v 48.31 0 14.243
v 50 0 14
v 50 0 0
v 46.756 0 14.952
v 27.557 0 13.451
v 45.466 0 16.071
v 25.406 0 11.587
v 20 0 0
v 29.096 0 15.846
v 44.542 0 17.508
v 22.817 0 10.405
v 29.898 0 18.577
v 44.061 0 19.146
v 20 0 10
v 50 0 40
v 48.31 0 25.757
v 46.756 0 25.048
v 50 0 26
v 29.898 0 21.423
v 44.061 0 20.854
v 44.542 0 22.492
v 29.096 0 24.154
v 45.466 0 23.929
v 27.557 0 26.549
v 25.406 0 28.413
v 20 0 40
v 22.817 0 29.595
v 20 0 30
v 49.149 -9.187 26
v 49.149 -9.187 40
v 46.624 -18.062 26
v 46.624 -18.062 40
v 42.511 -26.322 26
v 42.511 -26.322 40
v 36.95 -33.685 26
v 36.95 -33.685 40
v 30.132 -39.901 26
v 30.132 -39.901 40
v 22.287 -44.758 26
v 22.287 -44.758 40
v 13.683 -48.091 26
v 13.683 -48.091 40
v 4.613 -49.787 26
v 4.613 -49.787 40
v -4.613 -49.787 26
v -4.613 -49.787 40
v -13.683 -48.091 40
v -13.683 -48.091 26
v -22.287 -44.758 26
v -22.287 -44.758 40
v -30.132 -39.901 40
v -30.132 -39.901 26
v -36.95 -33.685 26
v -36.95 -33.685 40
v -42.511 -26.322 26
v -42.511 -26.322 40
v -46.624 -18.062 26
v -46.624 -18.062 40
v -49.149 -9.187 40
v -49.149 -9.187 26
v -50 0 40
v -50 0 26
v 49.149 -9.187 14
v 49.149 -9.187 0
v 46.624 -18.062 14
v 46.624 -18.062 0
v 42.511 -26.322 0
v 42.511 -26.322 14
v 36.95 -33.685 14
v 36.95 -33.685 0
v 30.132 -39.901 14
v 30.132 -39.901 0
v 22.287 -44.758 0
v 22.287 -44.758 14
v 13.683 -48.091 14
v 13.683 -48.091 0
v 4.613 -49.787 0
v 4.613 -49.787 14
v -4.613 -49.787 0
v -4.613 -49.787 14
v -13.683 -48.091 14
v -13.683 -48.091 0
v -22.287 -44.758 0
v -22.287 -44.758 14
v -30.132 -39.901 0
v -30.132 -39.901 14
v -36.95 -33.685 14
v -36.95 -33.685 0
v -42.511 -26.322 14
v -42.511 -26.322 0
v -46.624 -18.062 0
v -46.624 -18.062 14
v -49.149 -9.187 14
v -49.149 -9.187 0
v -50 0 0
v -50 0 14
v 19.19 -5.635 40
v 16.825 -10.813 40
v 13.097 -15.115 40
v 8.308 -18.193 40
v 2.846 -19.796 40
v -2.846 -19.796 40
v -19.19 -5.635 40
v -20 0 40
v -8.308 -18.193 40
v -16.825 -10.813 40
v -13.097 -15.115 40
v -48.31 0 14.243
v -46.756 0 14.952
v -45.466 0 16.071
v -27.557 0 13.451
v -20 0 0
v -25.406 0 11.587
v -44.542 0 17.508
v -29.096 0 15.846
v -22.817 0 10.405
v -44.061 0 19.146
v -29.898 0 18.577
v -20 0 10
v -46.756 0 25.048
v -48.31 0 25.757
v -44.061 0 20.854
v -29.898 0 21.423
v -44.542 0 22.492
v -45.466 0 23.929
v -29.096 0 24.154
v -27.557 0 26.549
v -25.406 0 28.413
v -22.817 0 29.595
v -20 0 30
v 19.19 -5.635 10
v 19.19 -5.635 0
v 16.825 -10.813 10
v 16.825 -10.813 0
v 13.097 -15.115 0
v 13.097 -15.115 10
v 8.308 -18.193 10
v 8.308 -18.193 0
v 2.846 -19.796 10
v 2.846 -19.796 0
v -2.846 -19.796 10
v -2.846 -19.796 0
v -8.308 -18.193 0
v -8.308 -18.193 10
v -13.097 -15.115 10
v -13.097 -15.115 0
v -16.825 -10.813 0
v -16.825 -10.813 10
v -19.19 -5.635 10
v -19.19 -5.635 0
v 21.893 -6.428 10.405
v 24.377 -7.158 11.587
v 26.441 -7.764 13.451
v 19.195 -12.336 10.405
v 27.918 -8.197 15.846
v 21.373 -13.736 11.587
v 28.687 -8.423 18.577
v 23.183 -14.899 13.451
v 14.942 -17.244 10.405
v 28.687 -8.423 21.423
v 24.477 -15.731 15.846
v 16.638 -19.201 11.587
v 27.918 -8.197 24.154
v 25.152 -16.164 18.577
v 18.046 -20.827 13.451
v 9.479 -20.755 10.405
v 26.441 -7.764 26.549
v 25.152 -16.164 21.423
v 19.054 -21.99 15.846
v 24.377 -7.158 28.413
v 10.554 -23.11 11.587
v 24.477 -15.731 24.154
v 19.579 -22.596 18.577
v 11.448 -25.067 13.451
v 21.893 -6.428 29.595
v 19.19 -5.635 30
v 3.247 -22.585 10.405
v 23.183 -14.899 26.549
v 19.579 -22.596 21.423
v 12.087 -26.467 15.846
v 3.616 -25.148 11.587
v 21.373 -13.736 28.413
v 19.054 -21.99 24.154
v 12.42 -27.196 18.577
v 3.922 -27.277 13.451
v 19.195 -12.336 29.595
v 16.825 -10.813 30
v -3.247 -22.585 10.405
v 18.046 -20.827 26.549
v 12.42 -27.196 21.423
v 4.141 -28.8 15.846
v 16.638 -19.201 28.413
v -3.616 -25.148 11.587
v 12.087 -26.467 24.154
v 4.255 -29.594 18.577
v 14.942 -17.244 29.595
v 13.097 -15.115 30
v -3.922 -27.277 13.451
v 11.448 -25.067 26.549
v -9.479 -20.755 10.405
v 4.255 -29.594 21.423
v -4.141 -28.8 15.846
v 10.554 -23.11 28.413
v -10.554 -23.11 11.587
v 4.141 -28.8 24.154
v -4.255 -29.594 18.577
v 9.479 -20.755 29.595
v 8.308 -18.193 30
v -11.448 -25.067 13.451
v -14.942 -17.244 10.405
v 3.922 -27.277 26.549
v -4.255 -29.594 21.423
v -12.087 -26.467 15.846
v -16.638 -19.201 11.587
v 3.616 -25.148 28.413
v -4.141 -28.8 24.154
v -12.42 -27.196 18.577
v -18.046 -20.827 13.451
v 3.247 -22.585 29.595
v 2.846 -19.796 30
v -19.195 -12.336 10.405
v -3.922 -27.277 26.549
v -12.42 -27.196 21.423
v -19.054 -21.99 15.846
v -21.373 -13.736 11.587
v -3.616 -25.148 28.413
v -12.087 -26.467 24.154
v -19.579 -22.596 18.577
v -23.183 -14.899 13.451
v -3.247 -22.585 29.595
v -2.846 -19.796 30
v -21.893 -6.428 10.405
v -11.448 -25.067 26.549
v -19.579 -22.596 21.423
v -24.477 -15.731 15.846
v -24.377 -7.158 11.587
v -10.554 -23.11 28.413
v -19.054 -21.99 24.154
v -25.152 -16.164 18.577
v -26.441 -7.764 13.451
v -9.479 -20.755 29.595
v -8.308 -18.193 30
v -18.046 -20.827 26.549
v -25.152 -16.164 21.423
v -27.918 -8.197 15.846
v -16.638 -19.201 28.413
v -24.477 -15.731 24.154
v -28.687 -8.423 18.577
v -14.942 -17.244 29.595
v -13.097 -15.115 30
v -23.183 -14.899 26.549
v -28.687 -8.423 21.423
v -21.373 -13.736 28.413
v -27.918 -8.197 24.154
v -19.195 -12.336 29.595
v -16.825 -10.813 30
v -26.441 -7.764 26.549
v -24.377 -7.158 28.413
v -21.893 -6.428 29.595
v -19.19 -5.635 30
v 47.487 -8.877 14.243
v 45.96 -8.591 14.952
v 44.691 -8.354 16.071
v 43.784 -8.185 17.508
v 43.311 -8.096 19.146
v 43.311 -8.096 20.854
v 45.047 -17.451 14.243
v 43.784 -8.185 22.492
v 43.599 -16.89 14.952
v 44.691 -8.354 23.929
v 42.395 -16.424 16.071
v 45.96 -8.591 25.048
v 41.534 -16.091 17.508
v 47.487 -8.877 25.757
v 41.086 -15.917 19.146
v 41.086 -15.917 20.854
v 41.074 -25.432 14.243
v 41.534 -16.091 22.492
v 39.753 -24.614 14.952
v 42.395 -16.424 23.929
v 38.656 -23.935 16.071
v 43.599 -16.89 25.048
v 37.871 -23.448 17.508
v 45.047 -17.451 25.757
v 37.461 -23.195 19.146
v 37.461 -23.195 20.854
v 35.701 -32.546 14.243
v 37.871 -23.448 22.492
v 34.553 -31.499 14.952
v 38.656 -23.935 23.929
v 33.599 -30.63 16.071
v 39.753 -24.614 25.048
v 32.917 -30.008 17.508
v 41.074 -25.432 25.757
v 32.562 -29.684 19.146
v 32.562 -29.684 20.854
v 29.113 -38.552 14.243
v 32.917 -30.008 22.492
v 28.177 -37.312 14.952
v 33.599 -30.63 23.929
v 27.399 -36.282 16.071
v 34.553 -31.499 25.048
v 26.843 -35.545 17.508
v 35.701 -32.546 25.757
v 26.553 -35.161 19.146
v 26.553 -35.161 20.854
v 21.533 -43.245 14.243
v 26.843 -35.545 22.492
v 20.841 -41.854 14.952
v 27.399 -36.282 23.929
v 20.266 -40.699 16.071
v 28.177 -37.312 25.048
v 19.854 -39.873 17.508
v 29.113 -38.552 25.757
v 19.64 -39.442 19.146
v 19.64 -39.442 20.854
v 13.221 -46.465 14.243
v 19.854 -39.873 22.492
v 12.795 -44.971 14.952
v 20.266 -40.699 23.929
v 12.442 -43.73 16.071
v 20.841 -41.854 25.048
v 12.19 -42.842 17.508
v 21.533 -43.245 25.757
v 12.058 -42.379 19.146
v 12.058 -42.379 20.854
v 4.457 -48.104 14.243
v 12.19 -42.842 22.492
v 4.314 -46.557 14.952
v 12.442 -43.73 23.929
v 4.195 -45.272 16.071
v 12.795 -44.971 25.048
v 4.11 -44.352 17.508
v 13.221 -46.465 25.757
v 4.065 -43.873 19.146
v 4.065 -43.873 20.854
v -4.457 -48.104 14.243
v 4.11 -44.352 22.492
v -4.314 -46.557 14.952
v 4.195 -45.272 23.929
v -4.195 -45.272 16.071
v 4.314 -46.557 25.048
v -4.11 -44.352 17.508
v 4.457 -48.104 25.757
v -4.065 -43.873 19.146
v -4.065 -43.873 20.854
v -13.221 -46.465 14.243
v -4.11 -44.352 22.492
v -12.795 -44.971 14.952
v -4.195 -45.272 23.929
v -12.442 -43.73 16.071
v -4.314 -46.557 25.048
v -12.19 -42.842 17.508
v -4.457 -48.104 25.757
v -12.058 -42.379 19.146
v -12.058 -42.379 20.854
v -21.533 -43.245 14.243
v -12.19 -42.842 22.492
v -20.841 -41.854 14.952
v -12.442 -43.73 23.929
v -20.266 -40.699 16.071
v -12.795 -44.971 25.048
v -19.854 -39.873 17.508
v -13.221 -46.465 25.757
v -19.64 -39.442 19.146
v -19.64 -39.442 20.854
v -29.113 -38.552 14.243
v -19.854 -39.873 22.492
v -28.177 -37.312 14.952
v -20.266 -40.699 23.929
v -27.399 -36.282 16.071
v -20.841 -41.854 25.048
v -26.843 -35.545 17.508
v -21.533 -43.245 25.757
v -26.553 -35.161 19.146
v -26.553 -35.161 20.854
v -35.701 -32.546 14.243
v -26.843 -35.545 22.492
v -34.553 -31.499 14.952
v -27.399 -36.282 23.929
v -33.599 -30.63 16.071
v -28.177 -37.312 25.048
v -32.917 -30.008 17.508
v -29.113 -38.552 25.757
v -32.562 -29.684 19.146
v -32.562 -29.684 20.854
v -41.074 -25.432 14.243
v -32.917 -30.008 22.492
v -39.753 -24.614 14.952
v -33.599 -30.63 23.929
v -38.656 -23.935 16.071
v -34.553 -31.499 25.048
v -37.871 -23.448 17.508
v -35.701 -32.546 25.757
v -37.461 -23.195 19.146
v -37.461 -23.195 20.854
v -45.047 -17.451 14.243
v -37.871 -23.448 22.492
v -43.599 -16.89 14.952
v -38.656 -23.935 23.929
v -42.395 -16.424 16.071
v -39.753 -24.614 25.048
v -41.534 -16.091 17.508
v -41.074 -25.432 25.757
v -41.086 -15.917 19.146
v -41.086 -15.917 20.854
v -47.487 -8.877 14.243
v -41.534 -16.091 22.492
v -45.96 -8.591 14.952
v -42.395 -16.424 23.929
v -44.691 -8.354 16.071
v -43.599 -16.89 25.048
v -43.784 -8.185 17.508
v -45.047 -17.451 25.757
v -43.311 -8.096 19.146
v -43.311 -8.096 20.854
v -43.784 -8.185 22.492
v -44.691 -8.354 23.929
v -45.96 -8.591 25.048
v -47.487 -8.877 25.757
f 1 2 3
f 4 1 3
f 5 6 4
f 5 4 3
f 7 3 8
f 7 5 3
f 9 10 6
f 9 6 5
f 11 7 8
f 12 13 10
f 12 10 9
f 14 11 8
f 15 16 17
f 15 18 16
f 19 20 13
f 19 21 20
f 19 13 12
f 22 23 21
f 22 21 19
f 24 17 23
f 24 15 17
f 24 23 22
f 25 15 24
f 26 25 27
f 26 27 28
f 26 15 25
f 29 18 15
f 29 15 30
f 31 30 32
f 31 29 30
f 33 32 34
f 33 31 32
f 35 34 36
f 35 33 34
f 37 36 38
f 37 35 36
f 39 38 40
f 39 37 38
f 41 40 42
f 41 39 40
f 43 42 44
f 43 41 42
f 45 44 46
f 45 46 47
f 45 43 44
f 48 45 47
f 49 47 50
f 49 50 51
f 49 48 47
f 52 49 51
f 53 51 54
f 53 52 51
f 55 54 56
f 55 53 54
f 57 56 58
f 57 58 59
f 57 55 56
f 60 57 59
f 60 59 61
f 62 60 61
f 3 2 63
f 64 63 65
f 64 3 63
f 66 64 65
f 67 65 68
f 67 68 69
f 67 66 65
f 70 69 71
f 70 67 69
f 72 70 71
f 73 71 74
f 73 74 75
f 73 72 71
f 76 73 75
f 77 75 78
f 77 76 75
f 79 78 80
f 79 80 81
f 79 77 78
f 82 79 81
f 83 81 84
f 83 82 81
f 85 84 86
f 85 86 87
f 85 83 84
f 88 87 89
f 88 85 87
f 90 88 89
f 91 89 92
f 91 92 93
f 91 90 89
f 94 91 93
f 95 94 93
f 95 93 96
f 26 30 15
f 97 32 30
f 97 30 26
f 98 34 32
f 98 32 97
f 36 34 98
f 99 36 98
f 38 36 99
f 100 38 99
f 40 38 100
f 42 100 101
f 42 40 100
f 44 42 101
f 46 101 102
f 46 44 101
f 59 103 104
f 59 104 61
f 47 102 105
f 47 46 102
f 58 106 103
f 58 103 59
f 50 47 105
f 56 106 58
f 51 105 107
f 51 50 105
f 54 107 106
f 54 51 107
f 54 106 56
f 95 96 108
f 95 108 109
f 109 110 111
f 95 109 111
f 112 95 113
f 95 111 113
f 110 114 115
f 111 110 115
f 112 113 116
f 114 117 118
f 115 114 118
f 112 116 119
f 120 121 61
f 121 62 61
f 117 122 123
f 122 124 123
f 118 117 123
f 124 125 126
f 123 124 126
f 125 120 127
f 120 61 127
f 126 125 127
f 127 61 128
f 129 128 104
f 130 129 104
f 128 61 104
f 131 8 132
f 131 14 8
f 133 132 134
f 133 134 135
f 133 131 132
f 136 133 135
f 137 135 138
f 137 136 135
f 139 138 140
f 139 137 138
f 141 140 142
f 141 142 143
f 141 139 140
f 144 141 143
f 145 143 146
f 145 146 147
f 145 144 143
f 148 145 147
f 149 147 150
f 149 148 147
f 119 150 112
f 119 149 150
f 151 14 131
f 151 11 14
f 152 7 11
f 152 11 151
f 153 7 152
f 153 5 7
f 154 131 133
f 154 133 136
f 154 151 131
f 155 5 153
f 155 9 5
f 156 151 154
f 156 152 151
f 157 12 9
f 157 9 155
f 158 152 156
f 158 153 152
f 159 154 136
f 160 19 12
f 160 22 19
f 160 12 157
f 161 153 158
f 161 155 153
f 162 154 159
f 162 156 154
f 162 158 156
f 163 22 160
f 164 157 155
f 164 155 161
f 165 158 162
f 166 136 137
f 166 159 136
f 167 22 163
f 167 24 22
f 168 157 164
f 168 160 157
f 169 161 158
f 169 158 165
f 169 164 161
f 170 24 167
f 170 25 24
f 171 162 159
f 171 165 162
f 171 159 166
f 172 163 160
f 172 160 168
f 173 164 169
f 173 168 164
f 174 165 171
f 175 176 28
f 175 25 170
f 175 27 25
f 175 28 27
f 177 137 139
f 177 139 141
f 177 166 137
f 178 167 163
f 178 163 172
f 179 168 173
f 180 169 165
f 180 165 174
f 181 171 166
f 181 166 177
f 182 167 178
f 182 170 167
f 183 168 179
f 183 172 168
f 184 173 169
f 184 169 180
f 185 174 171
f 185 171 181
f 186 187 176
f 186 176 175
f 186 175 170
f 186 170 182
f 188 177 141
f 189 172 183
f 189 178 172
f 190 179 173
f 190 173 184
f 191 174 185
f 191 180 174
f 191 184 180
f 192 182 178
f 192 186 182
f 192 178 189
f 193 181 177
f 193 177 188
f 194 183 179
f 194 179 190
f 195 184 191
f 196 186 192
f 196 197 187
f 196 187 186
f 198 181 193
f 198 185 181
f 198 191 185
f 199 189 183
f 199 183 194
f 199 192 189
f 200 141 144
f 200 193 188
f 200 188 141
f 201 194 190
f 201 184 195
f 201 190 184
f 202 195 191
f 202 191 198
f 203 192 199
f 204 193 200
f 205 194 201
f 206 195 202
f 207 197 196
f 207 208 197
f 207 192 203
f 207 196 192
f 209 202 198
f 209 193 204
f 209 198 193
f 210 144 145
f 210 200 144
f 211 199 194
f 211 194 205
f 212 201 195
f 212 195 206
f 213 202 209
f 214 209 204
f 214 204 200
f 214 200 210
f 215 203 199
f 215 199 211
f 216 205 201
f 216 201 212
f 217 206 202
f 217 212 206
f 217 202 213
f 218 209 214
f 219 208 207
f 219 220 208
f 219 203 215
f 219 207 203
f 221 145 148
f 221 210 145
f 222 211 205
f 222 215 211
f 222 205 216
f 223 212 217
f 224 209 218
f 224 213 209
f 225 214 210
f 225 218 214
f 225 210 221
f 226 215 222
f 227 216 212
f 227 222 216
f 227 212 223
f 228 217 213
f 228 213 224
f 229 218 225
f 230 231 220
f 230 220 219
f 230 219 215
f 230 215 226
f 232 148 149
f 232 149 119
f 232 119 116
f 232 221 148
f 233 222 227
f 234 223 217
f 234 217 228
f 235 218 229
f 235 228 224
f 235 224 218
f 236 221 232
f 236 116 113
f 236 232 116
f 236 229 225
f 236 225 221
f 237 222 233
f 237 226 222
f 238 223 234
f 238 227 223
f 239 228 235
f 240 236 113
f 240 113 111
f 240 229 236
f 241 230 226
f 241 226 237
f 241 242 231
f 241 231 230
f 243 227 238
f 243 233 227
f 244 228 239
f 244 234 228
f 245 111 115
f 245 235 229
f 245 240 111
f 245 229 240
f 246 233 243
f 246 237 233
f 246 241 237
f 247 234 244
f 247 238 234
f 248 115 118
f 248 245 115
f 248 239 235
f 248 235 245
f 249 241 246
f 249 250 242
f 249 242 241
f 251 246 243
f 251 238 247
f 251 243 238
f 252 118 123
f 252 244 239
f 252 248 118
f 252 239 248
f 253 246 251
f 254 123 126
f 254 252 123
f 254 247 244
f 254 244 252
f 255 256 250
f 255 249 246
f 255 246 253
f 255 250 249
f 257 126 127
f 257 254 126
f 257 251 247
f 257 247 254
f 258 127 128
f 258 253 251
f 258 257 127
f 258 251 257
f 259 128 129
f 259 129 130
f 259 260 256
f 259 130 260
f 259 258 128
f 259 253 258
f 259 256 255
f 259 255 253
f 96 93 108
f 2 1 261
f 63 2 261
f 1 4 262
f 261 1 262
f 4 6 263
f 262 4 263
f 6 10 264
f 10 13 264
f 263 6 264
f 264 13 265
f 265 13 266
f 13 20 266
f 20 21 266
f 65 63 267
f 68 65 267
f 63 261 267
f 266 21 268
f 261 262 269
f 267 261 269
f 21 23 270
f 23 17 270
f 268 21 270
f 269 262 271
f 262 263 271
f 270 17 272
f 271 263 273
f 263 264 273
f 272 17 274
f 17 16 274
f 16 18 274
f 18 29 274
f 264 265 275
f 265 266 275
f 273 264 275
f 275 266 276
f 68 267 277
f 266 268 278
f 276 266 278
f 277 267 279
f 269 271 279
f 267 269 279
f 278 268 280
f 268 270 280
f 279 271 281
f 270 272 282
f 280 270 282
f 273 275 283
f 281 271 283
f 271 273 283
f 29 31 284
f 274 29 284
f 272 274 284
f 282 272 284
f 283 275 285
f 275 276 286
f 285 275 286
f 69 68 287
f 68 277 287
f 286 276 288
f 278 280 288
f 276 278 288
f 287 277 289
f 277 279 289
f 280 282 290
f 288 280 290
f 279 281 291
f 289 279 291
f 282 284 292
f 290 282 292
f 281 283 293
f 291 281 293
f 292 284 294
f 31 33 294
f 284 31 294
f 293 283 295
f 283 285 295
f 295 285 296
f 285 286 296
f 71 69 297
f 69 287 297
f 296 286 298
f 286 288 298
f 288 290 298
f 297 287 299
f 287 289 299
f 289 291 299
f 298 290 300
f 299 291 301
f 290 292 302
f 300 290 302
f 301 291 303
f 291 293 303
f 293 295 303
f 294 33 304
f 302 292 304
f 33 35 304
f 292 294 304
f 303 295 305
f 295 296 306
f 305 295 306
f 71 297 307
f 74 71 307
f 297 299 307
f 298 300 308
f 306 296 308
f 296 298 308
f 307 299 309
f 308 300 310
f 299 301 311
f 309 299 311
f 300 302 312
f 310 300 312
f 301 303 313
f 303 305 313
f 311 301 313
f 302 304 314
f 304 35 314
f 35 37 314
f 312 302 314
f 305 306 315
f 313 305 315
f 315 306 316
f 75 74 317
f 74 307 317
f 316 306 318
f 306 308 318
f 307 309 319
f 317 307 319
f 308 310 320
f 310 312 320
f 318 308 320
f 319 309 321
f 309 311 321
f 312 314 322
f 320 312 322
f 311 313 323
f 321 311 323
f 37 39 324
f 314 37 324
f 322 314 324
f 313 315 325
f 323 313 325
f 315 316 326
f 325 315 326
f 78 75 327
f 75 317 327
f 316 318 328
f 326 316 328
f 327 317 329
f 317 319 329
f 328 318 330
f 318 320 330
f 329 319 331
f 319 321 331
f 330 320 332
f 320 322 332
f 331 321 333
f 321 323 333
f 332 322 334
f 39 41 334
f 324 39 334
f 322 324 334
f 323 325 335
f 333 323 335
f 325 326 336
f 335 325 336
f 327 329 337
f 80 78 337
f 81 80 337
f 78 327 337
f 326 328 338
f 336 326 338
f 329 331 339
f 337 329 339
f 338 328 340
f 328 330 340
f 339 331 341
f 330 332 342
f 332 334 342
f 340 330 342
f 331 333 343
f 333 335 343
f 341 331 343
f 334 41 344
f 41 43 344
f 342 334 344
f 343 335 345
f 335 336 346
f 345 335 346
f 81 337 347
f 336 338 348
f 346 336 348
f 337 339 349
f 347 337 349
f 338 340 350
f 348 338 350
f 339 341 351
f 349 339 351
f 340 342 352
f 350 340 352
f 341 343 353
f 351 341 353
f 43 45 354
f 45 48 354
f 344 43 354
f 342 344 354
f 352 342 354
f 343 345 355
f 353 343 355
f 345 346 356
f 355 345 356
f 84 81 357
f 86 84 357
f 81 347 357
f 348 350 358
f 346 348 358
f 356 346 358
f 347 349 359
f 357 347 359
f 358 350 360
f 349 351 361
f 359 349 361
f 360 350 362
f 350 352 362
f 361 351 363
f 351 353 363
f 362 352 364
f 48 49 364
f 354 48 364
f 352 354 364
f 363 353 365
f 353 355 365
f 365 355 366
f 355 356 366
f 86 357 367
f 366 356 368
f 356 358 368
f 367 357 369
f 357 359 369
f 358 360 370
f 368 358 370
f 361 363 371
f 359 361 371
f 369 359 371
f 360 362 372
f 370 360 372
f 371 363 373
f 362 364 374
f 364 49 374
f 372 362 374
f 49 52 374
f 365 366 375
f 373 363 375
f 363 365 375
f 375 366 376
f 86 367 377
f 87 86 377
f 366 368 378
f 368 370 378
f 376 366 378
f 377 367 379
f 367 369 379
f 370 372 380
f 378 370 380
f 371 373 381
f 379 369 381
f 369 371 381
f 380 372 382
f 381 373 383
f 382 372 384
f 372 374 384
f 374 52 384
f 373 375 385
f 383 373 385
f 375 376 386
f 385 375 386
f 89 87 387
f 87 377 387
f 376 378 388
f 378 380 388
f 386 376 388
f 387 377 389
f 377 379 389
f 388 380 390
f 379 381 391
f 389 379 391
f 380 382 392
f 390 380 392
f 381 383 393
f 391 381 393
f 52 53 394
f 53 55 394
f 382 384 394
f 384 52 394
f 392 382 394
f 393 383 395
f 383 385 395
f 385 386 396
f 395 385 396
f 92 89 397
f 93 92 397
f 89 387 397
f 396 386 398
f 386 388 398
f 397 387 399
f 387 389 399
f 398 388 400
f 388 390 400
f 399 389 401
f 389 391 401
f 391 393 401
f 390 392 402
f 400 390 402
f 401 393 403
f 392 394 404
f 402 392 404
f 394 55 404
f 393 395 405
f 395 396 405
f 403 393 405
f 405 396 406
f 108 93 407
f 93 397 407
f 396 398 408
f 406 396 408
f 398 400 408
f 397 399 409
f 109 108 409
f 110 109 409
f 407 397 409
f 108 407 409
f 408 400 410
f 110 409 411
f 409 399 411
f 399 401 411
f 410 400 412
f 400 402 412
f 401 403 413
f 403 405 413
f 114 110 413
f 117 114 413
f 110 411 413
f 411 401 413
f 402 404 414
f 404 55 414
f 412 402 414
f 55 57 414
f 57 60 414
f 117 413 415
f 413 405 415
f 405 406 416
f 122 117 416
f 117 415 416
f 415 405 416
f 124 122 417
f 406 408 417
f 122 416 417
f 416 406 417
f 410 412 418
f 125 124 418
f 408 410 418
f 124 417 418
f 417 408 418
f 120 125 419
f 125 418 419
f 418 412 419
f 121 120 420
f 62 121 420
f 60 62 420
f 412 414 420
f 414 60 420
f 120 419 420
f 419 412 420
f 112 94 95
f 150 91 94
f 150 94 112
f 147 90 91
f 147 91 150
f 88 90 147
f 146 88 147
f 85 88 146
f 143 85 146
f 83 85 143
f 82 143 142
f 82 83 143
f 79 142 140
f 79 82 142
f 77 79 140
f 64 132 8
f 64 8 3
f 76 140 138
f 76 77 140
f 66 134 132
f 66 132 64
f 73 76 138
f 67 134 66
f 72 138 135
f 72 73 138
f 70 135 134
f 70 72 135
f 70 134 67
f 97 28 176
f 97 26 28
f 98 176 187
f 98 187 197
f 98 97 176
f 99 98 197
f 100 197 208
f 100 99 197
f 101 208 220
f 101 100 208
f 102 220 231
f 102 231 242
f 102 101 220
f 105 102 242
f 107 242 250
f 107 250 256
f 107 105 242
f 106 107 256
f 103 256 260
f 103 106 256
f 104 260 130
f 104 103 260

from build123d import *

# Parameters (mm, degrees)
REVOLUTION_ANGLE = -180
SKETCH001_R      = 6
GROOVE_ANGLE     = 180


with BuildPart() as part:
    # Sketch → Revolution (revolve)
    with BuildSketch(Plane.XZ):
        with BuildLine():
            Line((20, 40), (50, 40))
            Line((50, 40), (50, 0))
            Line((50, 0), (20, 0))
            Line((20, 0), (20, 10))
            ThreePointArc((20, 10), (30, 20), (20, 30))
            Line((20, 30), (20, 40))
        make_face()
    revolve(axis=Axis((0, 0, 0), (0, 0, 1)), revolution_arc=REVOLUTION_ANGLE)

    # Sketch001 (on Face8 of Revolution) → Groove (revolve, cut)
    with BuildSketch(Plane(origin=(0, 0, 0), x_dir=(1, 0, 0), z_dir=(0, 1, 0))):
        with Locations((50, -20)):
            Circle(SKETCH001_R)
    revolve(axis=Axis((0, 0, 0), (0, 0, -1)), revolution_arc=GROOVE_ANGLE, mode=Mode.SUBTRACT)


solid = part.part
